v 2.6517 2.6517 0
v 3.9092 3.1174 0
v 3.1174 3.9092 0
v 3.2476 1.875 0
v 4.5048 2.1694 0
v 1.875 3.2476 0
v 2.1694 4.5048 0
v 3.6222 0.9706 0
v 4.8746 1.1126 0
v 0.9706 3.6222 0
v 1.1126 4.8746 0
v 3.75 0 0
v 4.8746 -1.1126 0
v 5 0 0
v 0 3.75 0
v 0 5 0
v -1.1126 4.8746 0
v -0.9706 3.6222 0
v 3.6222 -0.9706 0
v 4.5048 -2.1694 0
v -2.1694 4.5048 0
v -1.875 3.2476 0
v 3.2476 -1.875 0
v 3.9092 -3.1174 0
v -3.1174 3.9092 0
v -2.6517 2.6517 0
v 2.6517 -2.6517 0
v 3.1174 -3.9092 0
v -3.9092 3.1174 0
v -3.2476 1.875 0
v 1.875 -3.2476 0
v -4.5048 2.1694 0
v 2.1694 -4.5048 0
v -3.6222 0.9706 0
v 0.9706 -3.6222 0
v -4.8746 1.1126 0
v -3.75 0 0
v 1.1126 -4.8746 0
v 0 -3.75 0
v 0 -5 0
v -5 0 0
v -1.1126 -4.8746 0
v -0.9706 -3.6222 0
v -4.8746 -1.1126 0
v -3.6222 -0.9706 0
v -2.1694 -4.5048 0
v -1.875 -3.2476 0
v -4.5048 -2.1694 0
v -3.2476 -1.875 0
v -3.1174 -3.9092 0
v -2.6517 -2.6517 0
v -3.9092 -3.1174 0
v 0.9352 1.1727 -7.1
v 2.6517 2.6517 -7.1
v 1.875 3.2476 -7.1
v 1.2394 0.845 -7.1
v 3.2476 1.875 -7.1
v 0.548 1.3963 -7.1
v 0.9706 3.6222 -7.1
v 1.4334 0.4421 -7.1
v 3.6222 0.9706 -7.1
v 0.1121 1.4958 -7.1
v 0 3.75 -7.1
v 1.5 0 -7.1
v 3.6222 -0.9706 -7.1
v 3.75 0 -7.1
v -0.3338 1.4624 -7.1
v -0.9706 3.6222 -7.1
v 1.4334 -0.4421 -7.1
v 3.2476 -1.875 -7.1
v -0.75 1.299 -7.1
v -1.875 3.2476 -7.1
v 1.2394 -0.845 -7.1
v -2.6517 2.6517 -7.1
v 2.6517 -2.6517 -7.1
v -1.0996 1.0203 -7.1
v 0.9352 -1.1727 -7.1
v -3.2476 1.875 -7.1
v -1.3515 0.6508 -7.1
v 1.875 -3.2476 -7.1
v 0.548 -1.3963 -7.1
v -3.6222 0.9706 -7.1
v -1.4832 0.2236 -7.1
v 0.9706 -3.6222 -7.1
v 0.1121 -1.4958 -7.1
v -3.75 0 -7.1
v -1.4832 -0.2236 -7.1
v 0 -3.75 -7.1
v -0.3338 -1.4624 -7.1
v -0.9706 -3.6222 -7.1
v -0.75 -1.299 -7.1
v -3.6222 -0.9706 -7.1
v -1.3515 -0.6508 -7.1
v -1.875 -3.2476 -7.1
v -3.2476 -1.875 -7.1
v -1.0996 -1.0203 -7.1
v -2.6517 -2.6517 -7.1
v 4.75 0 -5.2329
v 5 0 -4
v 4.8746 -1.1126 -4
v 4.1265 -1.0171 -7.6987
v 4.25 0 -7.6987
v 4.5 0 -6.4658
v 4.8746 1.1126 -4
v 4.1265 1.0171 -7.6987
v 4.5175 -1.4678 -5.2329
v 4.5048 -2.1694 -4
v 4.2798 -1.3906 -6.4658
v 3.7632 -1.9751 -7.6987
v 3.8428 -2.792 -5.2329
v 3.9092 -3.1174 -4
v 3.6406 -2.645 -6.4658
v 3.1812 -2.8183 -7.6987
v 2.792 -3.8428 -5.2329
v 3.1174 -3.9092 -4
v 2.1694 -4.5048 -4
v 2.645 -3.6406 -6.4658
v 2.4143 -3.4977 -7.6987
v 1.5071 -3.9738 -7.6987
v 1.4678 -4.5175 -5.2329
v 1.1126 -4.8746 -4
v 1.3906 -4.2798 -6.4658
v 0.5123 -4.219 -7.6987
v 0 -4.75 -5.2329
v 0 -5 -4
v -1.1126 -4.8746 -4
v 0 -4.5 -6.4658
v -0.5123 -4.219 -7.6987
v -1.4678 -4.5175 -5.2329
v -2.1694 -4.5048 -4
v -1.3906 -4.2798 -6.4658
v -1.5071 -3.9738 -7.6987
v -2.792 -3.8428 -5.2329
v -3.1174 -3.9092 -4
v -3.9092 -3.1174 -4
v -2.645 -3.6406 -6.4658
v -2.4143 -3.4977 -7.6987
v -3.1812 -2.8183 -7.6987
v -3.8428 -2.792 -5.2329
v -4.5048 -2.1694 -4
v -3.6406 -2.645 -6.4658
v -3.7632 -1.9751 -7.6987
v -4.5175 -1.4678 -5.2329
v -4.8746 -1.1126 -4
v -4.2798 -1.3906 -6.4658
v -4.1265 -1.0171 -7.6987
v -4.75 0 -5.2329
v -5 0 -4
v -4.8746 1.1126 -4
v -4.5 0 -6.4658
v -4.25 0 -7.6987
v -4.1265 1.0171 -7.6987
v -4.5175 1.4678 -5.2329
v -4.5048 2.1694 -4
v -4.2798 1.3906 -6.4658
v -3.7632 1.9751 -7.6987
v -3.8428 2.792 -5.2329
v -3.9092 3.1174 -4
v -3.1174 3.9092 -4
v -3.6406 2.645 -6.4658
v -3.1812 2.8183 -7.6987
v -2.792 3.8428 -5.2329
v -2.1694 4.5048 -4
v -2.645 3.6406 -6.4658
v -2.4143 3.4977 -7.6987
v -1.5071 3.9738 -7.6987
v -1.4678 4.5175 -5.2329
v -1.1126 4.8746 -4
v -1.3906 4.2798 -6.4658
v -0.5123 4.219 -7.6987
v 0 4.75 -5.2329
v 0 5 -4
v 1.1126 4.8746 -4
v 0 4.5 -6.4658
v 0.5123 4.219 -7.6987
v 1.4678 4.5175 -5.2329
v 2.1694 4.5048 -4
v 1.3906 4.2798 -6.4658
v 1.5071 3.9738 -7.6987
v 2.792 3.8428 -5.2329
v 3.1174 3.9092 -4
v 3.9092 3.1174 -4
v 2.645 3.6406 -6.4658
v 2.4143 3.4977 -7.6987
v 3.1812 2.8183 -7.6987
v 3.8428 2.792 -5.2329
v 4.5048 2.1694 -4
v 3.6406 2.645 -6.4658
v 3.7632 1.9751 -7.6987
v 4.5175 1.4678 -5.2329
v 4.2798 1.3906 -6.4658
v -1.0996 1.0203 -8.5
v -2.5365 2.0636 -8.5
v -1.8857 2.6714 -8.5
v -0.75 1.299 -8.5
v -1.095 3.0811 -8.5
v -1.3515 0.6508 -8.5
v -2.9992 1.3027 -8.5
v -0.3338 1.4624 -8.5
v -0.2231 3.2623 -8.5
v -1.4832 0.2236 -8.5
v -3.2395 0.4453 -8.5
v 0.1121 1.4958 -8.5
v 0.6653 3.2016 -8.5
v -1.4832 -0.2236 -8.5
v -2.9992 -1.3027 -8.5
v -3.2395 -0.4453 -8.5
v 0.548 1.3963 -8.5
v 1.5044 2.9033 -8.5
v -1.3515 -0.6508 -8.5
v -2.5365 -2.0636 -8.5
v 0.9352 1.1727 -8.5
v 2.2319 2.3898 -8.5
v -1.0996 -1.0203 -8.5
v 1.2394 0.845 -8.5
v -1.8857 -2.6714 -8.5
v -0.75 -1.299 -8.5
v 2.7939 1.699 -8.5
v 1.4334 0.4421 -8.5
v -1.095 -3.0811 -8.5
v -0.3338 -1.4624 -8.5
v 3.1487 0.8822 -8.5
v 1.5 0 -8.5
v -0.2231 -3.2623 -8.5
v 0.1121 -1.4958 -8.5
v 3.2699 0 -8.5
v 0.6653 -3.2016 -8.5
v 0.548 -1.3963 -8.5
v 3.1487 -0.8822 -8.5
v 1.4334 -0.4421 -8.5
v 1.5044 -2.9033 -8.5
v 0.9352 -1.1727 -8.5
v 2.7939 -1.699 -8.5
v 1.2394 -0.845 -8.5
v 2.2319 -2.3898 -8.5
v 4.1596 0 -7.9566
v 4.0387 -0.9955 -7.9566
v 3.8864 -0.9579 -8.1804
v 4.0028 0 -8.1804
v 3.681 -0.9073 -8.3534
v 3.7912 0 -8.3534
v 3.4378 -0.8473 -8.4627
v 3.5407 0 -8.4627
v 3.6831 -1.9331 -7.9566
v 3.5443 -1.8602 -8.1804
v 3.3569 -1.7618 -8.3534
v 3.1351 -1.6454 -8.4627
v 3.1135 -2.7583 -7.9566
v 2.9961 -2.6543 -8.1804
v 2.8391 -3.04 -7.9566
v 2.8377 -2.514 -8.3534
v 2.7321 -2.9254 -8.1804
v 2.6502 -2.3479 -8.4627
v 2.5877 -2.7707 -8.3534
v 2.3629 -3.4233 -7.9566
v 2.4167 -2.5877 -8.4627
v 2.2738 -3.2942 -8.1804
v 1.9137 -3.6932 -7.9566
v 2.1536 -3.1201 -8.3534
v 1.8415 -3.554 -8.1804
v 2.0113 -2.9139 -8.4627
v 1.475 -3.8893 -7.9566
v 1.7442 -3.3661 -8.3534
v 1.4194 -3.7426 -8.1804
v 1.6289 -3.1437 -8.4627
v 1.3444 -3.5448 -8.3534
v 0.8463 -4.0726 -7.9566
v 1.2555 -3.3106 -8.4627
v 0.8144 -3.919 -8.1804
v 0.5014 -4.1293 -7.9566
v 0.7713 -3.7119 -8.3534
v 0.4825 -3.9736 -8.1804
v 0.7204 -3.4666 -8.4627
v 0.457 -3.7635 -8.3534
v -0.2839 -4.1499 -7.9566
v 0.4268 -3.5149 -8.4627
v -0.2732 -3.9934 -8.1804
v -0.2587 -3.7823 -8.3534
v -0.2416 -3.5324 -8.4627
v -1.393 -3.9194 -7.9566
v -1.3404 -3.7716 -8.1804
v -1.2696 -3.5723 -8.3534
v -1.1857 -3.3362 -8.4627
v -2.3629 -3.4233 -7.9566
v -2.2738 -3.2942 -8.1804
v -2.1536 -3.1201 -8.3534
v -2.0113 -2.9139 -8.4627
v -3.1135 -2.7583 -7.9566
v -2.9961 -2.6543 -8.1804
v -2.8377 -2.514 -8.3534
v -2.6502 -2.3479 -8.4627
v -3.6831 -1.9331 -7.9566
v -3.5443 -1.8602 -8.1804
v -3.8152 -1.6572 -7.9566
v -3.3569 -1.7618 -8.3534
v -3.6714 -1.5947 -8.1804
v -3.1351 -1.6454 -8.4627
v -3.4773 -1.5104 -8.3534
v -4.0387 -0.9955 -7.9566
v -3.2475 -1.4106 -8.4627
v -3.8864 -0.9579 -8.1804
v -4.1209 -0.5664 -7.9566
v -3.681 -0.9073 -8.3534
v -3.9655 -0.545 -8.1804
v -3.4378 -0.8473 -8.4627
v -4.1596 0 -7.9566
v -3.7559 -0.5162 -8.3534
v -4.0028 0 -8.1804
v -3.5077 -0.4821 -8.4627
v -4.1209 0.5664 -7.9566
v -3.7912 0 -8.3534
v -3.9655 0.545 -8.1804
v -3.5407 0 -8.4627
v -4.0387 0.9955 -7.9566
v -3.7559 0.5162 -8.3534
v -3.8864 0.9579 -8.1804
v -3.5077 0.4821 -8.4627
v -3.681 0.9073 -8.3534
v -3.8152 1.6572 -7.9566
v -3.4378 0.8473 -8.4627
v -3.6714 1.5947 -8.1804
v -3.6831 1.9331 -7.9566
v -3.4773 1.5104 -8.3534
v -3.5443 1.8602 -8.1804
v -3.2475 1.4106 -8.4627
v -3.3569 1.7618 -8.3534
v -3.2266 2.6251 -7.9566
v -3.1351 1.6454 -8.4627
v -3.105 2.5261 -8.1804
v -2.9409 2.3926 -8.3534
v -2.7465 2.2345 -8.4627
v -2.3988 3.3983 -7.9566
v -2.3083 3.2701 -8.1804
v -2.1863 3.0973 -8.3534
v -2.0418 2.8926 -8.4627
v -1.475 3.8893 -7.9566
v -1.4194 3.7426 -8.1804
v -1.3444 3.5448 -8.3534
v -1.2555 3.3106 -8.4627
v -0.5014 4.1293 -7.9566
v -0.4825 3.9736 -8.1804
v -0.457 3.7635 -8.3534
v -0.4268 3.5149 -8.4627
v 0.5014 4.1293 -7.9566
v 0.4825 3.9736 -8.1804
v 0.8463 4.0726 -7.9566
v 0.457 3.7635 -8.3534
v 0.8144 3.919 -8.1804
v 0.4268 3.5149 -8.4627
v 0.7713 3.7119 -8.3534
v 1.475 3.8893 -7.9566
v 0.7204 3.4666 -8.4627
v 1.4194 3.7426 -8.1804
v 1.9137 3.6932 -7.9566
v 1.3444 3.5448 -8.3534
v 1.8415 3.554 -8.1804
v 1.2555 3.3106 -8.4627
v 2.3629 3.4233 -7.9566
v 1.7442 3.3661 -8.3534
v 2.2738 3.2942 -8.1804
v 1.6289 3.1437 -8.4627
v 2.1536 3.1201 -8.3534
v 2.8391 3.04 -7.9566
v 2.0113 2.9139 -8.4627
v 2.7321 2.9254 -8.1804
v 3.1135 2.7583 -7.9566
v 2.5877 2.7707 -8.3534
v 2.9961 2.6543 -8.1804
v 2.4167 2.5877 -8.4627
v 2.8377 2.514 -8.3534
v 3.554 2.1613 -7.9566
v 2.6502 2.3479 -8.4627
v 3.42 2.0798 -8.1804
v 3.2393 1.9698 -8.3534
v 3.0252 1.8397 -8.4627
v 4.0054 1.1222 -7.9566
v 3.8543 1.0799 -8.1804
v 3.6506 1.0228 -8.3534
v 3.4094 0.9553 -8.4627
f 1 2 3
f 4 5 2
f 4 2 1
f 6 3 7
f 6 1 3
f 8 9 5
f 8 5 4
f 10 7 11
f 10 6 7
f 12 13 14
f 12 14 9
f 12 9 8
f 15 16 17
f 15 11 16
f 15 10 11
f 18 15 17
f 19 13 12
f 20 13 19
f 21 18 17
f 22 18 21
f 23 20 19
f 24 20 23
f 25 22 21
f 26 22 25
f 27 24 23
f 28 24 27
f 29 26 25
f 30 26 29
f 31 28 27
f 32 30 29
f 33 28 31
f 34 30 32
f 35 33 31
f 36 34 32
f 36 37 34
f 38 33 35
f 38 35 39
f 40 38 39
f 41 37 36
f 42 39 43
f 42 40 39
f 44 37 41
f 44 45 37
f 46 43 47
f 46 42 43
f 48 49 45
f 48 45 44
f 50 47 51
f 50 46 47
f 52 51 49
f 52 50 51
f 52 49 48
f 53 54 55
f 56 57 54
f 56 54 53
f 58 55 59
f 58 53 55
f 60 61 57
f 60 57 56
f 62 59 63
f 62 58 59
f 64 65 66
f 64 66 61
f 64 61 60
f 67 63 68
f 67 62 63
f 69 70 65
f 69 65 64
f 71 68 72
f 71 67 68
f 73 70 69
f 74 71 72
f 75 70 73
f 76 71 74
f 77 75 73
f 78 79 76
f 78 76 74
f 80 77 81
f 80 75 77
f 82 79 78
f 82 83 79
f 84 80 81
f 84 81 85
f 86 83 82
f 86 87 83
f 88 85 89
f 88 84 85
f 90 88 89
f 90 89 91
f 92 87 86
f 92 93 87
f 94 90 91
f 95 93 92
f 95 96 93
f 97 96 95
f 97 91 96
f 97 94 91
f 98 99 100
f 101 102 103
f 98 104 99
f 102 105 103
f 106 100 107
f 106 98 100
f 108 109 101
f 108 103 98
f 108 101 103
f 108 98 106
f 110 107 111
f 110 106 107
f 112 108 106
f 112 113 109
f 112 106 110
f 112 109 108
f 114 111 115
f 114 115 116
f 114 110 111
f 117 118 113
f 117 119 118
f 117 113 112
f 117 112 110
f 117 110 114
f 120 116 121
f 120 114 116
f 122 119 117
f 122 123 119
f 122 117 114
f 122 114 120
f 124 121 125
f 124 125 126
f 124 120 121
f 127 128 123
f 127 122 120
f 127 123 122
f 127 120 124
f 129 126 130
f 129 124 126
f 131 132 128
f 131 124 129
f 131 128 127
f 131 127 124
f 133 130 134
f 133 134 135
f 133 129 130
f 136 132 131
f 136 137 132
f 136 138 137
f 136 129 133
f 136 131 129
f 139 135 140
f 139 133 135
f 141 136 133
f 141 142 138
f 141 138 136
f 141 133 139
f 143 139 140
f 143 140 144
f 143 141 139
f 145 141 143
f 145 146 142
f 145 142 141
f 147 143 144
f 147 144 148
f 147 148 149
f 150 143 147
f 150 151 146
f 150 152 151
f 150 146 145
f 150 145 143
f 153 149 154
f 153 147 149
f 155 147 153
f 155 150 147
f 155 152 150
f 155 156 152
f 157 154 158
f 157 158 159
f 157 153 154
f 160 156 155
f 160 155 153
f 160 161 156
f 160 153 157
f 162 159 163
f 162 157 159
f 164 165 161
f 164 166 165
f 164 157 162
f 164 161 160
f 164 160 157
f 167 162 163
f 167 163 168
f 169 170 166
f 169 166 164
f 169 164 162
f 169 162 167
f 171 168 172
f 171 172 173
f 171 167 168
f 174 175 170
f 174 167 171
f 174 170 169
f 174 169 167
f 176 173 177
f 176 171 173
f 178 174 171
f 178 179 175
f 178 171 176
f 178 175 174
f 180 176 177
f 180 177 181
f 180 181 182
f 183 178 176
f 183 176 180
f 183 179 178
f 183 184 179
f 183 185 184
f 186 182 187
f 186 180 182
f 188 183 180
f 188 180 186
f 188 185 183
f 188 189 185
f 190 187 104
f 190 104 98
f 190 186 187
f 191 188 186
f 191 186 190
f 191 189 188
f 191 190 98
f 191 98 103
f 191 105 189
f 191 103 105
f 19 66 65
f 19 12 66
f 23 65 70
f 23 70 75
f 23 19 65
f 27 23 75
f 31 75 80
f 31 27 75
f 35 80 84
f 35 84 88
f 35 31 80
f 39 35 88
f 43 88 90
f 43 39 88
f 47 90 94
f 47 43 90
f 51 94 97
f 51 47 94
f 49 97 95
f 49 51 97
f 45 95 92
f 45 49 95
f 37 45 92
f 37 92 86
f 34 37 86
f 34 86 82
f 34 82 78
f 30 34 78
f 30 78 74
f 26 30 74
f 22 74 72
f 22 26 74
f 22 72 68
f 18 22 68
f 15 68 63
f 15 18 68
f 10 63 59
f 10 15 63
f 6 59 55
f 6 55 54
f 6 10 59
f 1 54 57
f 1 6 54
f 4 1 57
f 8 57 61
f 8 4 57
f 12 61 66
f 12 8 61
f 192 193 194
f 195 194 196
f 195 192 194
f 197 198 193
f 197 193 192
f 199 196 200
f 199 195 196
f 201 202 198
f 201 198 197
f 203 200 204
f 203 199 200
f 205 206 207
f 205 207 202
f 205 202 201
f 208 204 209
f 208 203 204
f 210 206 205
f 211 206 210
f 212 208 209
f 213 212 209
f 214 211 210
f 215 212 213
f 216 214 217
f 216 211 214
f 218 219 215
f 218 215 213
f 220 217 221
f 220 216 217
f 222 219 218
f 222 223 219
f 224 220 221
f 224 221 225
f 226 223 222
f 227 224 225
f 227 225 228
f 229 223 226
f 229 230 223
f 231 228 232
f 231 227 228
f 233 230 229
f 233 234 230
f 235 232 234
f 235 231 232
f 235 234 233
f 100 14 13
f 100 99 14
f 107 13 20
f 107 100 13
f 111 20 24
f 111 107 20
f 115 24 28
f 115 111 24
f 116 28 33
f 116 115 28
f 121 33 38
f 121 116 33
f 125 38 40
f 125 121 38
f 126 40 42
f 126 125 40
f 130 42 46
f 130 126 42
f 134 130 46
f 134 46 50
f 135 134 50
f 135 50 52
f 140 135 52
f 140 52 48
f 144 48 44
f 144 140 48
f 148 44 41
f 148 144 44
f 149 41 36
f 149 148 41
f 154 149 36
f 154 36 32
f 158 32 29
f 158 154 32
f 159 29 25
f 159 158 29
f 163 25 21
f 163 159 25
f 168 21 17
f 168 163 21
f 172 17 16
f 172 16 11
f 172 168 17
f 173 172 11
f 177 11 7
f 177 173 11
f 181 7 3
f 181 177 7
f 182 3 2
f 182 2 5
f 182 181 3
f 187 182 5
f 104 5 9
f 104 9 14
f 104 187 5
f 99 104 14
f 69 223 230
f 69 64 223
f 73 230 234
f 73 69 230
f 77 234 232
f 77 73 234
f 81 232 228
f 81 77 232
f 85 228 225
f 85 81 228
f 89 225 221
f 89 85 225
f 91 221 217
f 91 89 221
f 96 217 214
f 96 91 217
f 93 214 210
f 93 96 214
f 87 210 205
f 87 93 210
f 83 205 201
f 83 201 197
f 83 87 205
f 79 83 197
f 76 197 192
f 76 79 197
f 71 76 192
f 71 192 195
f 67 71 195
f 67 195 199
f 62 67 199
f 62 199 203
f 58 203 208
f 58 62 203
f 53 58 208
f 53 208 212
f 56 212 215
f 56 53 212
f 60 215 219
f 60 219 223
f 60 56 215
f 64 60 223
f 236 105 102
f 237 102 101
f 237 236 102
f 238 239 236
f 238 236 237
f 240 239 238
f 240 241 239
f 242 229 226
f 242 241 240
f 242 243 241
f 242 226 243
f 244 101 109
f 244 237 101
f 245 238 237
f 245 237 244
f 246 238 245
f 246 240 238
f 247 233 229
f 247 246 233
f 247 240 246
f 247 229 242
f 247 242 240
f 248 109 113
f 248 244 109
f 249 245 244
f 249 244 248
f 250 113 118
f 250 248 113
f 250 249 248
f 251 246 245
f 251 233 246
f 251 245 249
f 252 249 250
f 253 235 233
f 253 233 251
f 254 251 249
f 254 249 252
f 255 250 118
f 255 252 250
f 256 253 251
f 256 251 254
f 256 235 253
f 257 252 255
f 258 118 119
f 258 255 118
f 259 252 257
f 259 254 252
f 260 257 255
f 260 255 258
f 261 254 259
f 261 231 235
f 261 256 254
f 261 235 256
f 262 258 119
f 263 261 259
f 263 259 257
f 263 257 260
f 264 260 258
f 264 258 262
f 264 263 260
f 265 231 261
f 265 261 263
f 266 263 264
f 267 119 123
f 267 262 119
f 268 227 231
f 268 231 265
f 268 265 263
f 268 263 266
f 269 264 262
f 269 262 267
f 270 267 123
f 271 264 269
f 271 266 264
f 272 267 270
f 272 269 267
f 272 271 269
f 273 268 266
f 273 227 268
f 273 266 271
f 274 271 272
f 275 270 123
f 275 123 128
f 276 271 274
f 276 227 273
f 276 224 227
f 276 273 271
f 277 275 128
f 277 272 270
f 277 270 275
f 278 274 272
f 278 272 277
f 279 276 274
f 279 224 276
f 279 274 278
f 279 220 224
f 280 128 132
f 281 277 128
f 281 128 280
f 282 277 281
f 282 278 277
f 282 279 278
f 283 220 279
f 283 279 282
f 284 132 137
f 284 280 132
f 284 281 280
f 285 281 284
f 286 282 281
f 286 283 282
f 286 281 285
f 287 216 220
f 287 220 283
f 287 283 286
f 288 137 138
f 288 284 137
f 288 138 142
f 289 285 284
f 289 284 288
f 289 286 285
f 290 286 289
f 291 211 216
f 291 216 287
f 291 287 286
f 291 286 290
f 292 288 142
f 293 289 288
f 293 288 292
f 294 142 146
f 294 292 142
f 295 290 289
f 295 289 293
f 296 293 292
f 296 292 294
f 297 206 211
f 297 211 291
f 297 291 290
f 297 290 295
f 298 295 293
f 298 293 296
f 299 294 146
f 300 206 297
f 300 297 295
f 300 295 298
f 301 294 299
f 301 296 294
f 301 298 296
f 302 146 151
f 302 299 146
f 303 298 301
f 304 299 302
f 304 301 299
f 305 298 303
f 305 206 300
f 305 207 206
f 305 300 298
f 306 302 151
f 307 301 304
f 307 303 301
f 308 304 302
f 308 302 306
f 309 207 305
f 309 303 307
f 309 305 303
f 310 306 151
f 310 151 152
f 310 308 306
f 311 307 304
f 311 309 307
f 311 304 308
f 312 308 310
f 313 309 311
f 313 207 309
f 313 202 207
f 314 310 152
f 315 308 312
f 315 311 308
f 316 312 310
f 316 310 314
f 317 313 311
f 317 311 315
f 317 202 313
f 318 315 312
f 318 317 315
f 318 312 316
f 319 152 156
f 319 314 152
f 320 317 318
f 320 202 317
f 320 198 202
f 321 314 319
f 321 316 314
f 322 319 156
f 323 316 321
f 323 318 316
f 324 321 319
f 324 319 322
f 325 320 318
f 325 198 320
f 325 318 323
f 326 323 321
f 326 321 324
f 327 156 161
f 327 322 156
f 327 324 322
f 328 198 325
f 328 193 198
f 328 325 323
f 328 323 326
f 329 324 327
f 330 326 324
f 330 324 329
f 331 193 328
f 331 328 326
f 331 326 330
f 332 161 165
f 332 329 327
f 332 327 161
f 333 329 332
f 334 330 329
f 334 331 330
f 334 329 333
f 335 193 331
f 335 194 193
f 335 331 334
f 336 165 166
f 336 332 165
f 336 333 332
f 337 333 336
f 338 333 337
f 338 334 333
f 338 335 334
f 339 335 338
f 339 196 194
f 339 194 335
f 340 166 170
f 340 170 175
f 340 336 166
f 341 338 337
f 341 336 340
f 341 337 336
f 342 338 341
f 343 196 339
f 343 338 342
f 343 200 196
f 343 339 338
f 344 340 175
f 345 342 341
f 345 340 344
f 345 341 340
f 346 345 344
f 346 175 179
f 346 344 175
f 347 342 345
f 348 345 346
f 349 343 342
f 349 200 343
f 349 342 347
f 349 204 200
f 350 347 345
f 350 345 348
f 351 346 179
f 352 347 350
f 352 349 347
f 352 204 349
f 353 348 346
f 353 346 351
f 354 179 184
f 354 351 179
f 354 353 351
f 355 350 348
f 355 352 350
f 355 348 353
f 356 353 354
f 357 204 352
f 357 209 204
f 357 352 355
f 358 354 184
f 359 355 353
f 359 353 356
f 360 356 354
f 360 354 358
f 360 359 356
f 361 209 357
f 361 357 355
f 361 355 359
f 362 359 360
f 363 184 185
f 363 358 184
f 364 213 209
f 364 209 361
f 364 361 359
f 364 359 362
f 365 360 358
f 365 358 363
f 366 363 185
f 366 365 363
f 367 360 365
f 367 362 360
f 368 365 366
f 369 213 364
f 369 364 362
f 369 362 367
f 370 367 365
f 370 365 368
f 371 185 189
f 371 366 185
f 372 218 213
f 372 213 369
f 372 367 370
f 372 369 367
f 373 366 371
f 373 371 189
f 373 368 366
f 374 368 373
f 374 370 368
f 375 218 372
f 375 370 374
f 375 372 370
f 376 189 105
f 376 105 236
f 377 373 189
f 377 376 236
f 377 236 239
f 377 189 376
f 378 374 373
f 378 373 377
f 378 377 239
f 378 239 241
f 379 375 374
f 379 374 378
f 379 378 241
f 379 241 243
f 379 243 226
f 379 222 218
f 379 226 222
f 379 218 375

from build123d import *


with BuildPart() as part:
    # Эскиз1 → Повернуть1 (revolve)
    with BuildSketch(Plane(origin=(0, 0, 0), x_dir=(1, 0, 0), z_dir=(0, 1, 0))):
        with BuildLine():
            Line((5, 0), (5, 4))
            Line((5, 4), (4.25, 7.698728048))
            ThreePointArc((4.25, 7.698728048), (3.902903442, 8.27418604), (3.269945327, 8.5))
            Line((3.269945327, 8.5), (1.5, 8.5))
            Line((1.5, 8.5), (1.5, 7.1))
            Line((1.5, 7.1), (3.75, 7.1))
            Line((3.75, 7.1), (3.75, 0))
            Line((3.75, 0), (5, 0))
        make_face()
    revolve(axis=Axis((0, 0, 0), (0, 0, -1)))


solid = part.part
